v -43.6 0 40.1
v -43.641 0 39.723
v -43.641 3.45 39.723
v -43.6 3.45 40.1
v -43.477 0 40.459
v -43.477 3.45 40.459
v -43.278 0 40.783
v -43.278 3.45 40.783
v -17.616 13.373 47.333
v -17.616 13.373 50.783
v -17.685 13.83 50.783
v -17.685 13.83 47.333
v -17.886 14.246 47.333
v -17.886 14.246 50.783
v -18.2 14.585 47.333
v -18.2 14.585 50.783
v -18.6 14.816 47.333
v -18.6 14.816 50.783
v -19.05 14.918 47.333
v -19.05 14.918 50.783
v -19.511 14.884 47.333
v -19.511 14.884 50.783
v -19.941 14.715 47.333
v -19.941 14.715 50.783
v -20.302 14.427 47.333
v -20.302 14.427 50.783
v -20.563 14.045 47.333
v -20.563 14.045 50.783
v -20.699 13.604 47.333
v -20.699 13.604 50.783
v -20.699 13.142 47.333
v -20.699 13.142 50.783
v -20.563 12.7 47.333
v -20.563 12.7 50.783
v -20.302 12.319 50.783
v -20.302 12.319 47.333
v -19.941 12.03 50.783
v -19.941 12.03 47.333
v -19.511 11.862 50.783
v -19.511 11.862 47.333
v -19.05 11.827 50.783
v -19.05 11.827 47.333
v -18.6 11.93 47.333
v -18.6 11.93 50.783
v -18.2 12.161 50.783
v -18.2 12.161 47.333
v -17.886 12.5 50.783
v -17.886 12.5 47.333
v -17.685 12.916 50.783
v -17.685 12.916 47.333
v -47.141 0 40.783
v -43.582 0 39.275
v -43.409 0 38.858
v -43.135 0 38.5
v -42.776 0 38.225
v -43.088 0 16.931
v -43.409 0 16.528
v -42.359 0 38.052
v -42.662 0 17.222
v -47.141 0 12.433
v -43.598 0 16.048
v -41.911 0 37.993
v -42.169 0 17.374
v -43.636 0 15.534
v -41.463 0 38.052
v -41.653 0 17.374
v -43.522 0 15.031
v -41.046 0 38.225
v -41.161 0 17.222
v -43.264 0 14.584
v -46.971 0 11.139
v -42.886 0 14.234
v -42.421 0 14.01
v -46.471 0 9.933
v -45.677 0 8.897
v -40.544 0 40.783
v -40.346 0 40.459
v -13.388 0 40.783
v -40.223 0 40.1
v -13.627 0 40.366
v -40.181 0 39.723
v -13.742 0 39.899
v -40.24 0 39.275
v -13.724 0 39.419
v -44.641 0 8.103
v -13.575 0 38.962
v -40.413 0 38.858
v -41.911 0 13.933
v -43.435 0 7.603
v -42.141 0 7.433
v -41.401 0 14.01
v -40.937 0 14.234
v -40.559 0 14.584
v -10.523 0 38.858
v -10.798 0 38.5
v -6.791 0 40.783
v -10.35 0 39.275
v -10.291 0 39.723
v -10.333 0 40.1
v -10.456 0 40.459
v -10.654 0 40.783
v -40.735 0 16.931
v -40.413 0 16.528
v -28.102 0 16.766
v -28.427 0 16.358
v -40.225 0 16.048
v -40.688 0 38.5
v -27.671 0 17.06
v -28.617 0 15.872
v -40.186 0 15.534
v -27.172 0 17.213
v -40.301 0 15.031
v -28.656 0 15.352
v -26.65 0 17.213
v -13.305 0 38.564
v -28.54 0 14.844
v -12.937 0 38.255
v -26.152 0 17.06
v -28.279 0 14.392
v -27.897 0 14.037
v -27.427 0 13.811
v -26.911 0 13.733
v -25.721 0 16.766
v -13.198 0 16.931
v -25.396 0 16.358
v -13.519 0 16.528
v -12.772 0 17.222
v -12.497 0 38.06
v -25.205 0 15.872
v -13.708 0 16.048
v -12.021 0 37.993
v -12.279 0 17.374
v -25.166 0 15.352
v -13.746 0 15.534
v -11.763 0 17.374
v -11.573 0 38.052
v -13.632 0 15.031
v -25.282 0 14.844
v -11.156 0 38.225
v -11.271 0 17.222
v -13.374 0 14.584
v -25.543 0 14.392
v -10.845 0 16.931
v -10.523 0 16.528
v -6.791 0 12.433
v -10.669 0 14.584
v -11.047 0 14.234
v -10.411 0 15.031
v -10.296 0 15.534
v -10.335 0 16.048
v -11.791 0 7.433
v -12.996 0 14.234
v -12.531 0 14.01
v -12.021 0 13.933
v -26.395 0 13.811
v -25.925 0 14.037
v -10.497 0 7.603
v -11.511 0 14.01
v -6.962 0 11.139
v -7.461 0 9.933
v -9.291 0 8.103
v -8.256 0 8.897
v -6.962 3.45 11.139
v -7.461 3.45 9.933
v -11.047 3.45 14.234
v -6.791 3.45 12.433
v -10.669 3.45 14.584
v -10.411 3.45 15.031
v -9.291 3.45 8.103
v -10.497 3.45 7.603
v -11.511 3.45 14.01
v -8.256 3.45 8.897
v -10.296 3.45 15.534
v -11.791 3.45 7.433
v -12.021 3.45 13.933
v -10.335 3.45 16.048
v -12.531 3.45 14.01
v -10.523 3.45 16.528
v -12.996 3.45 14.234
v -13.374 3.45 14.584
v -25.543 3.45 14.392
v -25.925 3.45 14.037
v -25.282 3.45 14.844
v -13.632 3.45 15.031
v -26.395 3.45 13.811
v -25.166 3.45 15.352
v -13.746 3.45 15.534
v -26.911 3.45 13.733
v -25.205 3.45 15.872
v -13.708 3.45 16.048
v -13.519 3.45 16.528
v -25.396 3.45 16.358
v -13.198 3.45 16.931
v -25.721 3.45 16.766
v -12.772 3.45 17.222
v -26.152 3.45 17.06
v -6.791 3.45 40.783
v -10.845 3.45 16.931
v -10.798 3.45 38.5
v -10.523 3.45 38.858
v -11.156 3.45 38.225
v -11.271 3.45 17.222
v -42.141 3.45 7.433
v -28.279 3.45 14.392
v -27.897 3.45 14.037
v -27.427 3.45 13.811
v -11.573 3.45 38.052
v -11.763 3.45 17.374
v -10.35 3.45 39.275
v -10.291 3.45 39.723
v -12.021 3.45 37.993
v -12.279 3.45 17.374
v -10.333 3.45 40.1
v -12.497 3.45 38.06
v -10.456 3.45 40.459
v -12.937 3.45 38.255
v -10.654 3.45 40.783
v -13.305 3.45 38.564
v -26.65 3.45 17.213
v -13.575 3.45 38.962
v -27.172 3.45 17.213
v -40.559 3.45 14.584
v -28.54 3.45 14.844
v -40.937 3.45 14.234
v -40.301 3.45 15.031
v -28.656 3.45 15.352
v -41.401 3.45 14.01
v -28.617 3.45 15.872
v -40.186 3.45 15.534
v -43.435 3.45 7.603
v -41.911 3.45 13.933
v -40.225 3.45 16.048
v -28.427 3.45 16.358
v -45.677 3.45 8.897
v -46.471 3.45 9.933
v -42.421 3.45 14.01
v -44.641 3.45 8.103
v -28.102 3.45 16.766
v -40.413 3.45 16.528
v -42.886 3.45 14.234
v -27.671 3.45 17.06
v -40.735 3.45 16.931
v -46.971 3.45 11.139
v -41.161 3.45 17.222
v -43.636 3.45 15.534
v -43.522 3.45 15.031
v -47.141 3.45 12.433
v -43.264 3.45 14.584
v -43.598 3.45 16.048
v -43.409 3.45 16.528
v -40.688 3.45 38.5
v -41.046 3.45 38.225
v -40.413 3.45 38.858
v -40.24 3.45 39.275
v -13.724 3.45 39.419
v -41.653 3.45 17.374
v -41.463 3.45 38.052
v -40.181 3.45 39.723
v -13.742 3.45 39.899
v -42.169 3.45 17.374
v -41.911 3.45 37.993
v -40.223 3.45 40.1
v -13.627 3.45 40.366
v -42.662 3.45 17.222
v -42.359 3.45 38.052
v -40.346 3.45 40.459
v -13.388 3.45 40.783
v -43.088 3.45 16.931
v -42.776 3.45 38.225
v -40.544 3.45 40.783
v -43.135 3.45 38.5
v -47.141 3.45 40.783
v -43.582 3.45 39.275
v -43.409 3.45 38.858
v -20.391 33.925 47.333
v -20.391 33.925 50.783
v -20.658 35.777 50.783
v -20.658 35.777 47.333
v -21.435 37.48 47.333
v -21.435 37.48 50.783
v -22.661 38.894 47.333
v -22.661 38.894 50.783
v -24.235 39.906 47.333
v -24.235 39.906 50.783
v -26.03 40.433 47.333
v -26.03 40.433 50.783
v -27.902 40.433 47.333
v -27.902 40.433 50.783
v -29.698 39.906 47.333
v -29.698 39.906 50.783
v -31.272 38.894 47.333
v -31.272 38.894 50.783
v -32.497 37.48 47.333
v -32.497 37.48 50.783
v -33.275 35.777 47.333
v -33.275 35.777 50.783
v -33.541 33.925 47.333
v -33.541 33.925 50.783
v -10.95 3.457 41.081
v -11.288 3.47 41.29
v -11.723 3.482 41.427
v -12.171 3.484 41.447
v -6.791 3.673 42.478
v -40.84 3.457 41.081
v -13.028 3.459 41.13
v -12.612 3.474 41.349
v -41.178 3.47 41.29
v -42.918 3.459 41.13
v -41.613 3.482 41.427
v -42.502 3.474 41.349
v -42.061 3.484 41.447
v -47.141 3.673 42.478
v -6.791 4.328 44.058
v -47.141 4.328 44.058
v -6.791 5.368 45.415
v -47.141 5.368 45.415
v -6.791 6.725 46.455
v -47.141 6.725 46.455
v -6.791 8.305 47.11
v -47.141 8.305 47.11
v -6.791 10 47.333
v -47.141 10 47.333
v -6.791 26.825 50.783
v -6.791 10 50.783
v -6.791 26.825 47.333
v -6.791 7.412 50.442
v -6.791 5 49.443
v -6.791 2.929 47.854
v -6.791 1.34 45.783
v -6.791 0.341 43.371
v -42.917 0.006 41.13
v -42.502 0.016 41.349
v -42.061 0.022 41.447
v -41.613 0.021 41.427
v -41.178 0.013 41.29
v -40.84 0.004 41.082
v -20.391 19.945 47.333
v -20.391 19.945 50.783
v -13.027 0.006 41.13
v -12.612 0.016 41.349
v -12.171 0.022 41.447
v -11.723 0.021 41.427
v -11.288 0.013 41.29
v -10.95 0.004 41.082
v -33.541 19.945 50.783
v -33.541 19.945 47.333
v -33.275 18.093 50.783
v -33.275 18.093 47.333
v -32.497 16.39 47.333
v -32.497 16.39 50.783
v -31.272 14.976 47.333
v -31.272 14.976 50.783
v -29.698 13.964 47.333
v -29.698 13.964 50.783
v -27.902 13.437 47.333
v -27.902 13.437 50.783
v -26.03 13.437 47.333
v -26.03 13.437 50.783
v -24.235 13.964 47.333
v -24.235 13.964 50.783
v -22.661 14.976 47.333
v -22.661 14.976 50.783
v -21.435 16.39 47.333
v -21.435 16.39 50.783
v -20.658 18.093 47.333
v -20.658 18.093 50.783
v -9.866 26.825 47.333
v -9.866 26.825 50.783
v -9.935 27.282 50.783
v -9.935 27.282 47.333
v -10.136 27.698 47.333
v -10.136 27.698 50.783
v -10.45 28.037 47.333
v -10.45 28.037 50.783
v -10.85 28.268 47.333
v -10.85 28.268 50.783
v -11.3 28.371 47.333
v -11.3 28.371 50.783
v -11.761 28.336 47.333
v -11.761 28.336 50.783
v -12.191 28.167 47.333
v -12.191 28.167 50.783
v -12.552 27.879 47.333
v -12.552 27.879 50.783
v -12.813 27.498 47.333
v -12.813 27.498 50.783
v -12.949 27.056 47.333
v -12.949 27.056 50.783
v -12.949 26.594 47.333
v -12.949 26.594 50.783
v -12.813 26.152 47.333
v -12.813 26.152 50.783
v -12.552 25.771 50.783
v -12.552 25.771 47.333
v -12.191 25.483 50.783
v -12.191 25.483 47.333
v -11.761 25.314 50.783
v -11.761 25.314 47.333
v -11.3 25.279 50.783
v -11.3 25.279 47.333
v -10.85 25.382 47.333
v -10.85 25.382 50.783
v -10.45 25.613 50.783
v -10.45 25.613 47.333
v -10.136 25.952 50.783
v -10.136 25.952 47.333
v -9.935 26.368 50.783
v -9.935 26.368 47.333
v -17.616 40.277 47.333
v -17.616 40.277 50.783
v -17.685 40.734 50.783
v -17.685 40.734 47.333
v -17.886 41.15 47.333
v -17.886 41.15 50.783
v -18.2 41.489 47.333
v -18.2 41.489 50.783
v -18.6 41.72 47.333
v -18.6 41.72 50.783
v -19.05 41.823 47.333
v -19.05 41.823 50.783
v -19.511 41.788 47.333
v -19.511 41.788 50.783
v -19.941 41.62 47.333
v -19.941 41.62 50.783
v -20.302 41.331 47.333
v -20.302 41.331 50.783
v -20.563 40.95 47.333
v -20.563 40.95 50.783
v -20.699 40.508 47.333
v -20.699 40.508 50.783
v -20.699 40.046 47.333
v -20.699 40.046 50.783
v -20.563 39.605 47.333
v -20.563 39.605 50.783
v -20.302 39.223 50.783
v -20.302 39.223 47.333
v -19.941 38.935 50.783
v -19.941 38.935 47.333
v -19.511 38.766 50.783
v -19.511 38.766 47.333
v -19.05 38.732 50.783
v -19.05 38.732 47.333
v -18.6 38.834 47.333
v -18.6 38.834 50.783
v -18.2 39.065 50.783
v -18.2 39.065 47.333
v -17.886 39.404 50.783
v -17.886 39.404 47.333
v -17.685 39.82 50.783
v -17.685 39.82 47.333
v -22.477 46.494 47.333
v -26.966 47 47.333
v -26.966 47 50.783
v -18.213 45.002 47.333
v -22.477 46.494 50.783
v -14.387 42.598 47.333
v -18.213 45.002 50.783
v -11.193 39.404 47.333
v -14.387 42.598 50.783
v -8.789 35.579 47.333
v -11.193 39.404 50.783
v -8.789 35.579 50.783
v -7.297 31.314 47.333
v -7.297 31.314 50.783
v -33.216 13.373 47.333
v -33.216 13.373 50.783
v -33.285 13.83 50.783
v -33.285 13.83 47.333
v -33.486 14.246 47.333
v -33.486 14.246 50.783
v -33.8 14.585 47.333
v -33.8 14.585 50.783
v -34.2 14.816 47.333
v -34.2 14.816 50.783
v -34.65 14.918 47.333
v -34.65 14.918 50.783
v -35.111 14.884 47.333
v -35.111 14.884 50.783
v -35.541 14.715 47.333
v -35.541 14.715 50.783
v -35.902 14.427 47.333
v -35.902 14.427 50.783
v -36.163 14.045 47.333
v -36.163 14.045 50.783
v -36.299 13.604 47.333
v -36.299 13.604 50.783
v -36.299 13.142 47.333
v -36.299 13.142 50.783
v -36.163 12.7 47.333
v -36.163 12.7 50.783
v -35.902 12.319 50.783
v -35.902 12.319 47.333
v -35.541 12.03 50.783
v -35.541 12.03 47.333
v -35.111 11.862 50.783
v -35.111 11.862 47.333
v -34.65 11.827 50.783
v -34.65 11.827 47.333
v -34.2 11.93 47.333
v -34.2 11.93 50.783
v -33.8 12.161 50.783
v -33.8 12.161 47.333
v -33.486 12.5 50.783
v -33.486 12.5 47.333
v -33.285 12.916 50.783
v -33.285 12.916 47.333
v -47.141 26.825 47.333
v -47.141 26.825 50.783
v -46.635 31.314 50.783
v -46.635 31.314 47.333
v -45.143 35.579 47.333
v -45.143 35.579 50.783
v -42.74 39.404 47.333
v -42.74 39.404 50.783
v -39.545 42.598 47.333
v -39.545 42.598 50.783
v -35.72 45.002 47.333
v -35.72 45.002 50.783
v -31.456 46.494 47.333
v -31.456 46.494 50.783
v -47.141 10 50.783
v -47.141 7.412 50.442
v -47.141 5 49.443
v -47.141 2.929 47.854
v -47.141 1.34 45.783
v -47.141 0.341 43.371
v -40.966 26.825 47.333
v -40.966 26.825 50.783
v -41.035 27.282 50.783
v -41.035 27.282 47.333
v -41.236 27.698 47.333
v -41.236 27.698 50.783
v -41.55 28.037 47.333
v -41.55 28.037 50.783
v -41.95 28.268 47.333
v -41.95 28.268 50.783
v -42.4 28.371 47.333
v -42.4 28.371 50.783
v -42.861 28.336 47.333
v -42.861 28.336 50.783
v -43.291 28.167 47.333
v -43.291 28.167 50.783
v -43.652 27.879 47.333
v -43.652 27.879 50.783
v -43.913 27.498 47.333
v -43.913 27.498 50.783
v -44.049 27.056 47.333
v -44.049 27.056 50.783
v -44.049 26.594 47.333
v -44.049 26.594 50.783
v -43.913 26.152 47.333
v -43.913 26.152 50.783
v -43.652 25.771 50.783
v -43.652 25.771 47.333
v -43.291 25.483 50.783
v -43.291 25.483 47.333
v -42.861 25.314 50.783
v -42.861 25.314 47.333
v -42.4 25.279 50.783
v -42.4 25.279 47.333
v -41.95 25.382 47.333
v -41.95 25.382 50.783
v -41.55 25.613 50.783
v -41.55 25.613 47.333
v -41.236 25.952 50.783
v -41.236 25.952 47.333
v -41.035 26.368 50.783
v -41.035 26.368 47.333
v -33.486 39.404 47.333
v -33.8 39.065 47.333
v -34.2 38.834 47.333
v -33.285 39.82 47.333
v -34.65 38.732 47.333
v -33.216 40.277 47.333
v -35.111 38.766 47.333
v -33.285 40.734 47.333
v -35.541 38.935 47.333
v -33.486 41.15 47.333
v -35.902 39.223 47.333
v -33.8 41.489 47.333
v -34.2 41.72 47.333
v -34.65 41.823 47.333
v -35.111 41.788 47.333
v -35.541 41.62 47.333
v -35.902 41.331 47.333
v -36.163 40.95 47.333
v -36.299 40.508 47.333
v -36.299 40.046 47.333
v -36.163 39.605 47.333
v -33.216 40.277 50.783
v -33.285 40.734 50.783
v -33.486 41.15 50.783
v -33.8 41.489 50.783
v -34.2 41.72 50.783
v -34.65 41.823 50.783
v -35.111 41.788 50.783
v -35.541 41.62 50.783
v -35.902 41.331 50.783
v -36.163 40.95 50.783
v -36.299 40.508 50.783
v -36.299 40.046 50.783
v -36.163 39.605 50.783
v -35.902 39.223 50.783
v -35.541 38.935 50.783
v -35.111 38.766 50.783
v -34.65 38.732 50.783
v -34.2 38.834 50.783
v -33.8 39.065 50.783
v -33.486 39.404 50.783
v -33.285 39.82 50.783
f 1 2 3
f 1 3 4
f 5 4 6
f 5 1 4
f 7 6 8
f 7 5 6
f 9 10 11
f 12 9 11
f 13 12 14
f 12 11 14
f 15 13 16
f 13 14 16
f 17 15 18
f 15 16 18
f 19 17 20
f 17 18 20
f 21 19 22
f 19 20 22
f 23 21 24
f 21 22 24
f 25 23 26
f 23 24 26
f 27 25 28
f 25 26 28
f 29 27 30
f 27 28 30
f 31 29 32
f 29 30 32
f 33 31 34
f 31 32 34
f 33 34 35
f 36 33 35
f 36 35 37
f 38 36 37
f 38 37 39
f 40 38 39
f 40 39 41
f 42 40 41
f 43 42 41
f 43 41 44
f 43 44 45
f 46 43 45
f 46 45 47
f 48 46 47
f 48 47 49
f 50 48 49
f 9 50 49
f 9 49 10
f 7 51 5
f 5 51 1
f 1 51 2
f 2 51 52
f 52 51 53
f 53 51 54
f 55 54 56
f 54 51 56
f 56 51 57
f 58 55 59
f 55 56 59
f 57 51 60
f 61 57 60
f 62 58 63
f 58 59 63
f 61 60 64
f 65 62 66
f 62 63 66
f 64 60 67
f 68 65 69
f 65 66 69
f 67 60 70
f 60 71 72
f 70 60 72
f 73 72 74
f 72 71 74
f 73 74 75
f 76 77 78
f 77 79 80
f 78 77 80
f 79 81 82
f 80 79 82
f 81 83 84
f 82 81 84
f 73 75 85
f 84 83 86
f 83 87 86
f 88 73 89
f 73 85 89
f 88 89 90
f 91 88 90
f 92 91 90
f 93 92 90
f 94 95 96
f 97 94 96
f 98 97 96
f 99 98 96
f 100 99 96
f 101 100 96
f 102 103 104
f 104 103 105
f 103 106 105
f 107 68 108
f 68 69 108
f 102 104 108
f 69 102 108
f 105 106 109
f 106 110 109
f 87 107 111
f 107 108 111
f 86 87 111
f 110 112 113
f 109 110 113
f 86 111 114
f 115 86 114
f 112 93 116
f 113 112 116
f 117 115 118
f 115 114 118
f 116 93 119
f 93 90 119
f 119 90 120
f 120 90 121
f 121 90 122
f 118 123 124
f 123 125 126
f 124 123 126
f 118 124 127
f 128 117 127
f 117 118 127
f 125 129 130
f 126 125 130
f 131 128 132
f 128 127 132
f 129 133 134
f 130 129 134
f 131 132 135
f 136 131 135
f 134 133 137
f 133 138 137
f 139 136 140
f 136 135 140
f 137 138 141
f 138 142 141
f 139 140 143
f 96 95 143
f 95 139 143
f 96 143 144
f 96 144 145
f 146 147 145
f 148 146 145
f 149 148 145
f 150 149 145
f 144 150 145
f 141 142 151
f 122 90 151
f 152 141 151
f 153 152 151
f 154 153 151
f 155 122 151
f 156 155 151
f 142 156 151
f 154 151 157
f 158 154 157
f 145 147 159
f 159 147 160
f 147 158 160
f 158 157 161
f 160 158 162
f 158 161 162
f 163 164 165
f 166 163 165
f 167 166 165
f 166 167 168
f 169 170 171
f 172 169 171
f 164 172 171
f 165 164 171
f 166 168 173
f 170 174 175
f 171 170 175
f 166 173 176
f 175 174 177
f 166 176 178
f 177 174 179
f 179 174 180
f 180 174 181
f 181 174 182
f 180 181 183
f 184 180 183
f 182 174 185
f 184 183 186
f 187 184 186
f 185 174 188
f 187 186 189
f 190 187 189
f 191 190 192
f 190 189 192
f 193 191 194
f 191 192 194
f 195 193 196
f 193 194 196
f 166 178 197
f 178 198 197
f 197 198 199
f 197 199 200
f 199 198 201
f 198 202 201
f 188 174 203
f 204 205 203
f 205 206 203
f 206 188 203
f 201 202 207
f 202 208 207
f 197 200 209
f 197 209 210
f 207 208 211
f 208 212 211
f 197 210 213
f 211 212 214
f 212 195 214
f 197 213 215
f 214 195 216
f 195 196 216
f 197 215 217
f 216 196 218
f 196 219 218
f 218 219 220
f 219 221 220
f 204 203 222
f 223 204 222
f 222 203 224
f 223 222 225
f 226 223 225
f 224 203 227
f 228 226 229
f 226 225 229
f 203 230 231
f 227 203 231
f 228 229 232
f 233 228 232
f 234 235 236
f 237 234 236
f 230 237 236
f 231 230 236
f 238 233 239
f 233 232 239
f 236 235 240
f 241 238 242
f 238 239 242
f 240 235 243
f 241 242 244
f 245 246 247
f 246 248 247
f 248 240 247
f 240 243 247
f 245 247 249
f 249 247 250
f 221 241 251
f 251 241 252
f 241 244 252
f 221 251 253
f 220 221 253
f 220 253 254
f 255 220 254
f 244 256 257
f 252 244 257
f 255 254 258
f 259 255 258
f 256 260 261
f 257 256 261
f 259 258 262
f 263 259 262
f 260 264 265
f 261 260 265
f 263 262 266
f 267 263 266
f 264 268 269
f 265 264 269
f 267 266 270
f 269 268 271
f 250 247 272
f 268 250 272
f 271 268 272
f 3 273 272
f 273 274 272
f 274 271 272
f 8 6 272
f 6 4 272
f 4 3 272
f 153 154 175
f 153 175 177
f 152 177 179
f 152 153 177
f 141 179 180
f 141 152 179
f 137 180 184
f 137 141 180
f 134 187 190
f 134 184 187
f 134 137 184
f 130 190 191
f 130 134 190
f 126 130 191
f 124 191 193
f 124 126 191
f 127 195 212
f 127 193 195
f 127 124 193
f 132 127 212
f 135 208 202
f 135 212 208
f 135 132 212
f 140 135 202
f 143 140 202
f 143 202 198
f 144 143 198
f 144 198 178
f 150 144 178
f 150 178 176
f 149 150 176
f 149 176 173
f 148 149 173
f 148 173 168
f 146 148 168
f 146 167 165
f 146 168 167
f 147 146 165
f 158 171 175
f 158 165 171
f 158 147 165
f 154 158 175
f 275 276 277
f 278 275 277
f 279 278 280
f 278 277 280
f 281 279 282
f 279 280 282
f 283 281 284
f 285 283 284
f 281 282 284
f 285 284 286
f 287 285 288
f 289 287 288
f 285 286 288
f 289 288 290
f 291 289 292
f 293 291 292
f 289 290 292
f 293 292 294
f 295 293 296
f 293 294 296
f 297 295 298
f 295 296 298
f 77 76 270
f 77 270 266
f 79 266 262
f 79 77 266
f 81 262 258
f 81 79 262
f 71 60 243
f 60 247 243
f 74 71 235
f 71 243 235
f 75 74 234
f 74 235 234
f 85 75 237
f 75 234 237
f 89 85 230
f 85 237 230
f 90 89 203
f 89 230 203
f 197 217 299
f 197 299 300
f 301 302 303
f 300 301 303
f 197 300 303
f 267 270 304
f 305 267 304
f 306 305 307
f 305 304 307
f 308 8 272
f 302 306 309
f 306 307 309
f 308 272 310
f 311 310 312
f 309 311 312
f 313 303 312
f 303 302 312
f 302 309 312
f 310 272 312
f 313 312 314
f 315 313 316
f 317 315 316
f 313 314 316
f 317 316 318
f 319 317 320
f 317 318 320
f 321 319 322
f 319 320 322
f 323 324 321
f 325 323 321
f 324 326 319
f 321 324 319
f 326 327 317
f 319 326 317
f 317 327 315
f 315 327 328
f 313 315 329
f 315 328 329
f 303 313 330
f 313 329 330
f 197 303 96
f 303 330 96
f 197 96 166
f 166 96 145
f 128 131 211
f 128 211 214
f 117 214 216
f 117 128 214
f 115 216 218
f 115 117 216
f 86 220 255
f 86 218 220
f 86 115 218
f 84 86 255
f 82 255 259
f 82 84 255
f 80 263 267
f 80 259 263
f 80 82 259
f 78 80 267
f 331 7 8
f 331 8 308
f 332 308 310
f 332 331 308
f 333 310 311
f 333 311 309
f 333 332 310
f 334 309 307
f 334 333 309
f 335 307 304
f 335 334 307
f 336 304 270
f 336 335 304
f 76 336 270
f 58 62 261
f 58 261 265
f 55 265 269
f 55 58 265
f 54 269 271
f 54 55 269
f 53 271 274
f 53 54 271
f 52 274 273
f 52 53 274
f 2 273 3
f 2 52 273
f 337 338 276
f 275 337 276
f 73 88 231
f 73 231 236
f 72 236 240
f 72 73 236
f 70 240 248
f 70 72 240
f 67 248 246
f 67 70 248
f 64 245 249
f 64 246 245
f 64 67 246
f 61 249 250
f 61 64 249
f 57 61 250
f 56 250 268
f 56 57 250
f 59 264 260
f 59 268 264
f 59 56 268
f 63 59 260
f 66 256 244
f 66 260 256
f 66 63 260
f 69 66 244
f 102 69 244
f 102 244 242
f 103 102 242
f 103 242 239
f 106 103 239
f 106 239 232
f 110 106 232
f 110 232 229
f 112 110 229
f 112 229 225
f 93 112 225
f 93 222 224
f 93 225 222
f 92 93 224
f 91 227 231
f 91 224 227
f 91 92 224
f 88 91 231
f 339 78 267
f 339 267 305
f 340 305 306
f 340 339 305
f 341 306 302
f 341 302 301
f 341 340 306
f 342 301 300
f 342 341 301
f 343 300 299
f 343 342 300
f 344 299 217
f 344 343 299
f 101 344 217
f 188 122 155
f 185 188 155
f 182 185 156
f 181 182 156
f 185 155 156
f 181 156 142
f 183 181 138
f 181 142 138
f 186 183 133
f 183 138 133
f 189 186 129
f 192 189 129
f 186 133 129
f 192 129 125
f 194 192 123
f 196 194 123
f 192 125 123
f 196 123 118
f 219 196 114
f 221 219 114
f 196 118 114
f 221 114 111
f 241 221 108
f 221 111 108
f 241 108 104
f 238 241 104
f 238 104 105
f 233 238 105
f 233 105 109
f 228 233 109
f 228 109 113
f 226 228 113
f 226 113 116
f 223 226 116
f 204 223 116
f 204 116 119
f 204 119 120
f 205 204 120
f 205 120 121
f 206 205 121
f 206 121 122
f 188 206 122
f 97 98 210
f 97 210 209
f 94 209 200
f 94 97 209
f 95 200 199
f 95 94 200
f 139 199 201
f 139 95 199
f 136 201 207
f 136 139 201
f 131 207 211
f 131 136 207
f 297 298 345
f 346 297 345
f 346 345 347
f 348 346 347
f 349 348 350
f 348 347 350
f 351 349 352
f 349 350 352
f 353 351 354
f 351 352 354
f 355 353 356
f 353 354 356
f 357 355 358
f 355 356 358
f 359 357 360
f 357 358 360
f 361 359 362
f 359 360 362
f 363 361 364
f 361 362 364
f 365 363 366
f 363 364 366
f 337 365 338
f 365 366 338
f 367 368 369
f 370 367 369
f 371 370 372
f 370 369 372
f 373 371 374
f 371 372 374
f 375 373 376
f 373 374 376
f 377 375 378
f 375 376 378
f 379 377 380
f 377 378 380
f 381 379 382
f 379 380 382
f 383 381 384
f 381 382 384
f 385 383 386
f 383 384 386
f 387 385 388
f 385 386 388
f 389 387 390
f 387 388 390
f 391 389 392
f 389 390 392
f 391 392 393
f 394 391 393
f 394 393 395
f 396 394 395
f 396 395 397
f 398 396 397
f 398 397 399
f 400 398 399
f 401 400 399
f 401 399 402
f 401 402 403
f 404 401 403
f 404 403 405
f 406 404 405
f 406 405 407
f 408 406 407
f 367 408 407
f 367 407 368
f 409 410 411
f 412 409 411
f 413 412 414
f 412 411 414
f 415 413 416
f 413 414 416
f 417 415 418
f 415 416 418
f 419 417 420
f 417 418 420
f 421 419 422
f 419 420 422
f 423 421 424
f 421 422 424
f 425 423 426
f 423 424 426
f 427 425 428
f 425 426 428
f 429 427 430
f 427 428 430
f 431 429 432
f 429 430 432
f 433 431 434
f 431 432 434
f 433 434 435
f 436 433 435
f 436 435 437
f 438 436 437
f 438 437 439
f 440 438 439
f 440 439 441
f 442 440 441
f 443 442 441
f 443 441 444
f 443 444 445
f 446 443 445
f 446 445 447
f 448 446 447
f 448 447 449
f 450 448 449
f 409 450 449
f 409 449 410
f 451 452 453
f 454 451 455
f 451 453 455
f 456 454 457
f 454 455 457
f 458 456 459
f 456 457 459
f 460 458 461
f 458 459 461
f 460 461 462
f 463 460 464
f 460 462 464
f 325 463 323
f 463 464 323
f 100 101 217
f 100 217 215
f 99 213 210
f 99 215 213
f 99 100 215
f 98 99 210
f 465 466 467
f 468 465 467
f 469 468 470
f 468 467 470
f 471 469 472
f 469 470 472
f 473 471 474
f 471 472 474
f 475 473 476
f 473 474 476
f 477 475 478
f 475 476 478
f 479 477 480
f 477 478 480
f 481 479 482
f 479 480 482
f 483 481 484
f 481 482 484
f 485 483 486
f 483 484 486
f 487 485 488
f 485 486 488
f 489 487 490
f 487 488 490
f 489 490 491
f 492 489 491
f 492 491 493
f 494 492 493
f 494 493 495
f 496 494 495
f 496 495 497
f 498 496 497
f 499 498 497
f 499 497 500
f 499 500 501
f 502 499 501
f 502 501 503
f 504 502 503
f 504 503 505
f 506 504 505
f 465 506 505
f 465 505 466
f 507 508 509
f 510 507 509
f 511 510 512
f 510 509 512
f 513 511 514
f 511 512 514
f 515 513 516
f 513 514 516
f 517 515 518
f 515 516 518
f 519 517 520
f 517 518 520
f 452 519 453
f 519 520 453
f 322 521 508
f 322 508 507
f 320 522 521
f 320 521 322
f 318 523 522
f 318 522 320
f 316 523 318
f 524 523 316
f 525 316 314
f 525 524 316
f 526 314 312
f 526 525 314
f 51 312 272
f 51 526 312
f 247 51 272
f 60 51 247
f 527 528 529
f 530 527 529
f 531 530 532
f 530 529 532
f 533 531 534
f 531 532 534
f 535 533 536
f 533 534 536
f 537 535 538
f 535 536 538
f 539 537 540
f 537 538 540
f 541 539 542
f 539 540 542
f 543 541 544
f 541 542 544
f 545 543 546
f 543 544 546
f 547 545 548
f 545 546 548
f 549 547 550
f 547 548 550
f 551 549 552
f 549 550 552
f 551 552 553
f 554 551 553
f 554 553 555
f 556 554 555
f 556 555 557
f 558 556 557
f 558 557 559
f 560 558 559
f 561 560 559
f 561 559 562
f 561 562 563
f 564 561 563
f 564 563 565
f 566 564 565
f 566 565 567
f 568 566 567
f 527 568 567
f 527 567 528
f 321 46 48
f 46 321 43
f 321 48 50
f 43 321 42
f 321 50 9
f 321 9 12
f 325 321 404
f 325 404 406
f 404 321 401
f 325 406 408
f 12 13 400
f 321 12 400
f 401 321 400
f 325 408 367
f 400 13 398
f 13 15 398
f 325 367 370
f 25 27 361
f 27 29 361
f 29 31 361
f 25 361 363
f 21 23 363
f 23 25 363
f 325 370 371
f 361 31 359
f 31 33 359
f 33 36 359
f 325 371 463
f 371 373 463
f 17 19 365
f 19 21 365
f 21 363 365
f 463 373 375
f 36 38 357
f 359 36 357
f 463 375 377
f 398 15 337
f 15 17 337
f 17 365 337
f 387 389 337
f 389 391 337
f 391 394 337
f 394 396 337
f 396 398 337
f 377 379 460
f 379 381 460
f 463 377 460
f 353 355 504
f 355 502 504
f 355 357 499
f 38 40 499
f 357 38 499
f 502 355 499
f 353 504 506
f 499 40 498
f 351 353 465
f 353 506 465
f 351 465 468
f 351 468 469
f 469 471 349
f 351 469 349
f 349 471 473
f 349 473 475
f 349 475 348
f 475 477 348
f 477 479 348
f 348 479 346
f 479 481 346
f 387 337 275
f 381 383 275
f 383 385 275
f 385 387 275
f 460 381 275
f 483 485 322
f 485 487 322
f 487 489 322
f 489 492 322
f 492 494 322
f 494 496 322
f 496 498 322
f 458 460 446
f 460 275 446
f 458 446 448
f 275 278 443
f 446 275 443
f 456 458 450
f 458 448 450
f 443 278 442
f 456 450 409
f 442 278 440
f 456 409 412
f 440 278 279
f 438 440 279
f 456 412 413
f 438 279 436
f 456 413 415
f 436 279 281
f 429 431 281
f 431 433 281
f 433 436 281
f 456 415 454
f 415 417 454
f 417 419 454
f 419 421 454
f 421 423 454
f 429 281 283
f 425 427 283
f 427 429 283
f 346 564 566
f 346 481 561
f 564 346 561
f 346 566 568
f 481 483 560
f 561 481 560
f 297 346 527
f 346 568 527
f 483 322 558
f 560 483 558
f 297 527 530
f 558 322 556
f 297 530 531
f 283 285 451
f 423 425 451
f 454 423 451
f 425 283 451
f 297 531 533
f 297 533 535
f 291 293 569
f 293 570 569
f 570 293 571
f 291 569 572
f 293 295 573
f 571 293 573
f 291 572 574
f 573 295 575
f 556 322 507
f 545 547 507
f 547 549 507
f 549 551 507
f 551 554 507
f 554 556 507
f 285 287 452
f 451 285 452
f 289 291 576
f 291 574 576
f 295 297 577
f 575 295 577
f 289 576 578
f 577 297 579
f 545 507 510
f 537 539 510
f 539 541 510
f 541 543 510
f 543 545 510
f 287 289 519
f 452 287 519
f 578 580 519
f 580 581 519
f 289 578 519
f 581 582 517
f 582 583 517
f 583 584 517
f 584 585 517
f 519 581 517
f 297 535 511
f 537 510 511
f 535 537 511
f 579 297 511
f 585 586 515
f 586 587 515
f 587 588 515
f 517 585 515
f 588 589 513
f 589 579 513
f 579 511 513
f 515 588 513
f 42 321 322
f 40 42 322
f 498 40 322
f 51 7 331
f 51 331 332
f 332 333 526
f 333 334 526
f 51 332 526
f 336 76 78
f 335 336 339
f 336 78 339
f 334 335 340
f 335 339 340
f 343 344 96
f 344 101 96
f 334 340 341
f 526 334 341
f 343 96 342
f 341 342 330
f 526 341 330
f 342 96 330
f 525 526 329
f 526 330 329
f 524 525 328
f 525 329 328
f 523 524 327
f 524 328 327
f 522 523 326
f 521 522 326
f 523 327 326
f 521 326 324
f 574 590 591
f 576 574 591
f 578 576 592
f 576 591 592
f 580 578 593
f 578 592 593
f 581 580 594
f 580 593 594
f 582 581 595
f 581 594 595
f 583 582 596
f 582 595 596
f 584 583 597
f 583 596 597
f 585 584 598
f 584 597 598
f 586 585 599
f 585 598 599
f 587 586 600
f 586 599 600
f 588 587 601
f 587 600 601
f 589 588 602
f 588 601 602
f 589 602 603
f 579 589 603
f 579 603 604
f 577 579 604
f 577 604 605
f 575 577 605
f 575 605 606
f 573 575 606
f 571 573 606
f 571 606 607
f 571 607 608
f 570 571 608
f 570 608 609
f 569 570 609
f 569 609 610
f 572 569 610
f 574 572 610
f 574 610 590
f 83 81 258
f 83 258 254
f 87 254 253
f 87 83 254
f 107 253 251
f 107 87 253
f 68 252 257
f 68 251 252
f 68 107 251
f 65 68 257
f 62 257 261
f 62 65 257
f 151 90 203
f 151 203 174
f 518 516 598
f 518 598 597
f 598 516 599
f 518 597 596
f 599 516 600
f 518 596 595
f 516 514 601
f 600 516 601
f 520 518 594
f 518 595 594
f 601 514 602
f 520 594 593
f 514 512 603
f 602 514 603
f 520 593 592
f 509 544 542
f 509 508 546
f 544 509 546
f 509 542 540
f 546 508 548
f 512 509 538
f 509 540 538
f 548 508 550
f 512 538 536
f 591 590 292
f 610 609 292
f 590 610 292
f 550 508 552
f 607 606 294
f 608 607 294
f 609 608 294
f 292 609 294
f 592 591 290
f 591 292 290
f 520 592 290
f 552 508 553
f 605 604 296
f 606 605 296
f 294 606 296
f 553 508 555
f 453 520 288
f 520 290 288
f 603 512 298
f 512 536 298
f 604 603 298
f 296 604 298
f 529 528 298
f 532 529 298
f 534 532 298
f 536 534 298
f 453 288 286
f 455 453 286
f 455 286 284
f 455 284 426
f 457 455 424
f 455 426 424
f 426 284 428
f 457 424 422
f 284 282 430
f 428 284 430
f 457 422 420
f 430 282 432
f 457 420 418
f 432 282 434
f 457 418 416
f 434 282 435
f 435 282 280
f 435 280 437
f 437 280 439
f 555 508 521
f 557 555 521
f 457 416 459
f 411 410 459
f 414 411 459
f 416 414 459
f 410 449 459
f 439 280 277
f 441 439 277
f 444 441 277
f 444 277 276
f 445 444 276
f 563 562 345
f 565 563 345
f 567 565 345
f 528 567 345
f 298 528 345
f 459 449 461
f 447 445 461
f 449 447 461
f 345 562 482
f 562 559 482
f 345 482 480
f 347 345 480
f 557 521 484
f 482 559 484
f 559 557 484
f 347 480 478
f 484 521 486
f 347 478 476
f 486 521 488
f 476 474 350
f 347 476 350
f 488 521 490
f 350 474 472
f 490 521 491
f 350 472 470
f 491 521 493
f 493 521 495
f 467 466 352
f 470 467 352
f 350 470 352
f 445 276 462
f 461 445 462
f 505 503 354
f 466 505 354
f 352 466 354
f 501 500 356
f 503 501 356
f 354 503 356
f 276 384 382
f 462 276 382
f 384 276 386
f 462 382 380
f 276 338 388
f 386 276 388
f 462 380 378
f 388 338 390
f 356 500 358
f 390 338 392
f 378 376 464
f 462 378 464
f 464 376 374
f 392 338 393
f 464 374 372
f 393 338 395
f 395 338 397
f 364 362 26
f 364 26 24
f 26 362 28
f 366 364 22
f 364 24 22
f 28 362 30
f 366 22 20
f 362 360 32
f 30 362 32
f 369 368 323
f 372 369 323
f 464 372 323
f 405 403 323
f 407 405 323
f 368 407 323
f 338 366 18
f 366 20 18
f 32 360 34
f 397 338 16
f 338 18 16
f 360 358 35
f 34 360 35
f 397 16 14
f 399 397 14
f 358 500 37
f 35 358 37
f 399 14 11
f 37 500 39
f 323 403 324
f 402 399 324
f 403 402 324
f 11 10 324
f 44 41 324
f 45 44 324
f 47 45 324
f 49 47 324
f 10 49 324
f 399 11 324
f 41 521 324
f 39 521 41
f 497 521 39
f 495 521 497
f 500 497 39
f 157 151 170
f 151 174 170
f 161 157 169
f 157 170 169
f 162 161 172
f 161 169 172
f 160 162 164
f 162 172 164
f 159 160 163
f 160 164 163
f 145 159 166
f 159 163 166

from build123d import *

# Parameters (mm, degrees)
SKETCH1_W               = 40.35
SKETCH1_H               = 43.35
BOSS_EXTRUDE1_DEPTH     = 47
CUT_EXTRUDE2_DEPTH      = 102
FILLET1_R               = 10
CUT_EXTRUDE3_DEPTH      = 102
FILLET2_R               = 5
CUT_EXTRUDE4_DEPTH      = 102
CUT_EXTRUDE4_DEPTH_BACK = 102
SKETCH6_R               = 1.73
CUT_EXTRUDE5_DEPTH      = 102
SKETCH8_R               = 1.55
CUT_EXTRUDE6_DEPTH      = 102
SKETCH9_R               = 1.75
CUT_EXTRUDE7_DEPTH      = 10


with BuildPart() as part:
    # Sketch1 → Boss-Extrude1 (new body)
    with BuildSketch(Plane(origin=(0, 0, 0), x_dir=(1, 0, 0), z_dir=(0, 1, 0))):
        with Locations((-26.966212793, -29.108023223)):
            Rectangle(SKETCH1_W, SKETCH1_H)
    extrude(amount=BOSS_EXTRUDE1_DEPTH)

    # Sketch3 → Cut-Extrude2 (cut)
    with BuildSketch(Plane.XY.offset(50.783023223)):
        with BuildLine():
            Line((-6.791212793, 47), (-26.966212793, 47))
            ThreePointArc((-26.966212793, 47), (-12.700333482, 41.09087931), (-6.791212793, 26.825))
            Line((-6.791212793, 26.825), (-6.791212793, 47))
        make_face()
        with BuildLine():
            Line((-47.141212793, 47), (-47.141212793, 26.825))
            ThreePointArc((-47.141212793, 26.825), (-41.232092103, 41.09087931), (-26.966212793, 47))
            Line((-26.966212793, 47), (-47.141212793, 47))
        make_face()
    extrude(amount=-CUT_EXTRUDE2_DEPTH, mode=Mode.SUBTRACT)

    # Fillet1
    fillet1_edges = [part.edges().sort_by_distance(p)[0] for p in [
        (-26.966212793, 0, 50.783023223),
    ]]
    fillet(fillet1_edges, radius=FILLET1_R)

    # Sketch5 → Cut-Extrude3 (cut)
    with BuildSketch(Plane.ZY.offset(47.141212793)):
        with BuildLine():
            Line((47.333023223, 59.778436909), (-6.665763497, 59.778436909))
            Line((-6.665763497, 59.778436909), (-6.665763497, 3.45))
            Line((-6.665763497, 3.45), (40.783023223, 3.45))
            ThreePointArc((40.783023223, 3.45), (45.41457264, 5.368450583), (47.333023223, 10))
            Line((47.333023223, 10), (47.333023223, 59.778436909))
        make_face()
    extrude(amount=-CUT_EXTRUDE3_DEPTH, mode=Mode.SUBTRACT)

    # Fillet2
    fillet2_edges = [part.edges().sort_by_distance(p)[0] for p in [
        (-6.791212793, 1.725, 7.433023223),
        (-47.141212793, 1.725, 7.433023223),
    ]]
    fillet(fillet2_edges, radius=FILLET2_R)

    # Sketch6 → Cut-Extrude4 (cut, two sides: drawn at the far end of the back side and taken through both)
    with BuildSketch(Plane(origin=(0, 3.45, 0), x_dir=(1, 0, 0), z_dir=(0, 1, 0)).offset(-CUT_EXTRUDE4_DEPTH_BACK)):
        with Locations((-41.911212793, -15.663023223)):
            Circle(SKETCH6_R)
        with Locations((-41.911212793, -39.723023223)):
            Circle(SKETCH6_R)
        with Locations((-12.021212793, -15.663023223)):
            Circle(SKETCH6_R)
        with Locations((-12.021212793, -39.723023223)):
            Circle(SKETCH6_R)
    extrude(amount=CUT_EXTRUDE4_DEPTH + CUT_EXTRUDE4_DEPTH_BACK, mode=Mode.SUBTRACT)

    # Sketch7 → Cut-Extrude5 (cut)
    with BuildSketch(Plane.XY.offset(50.783023223)):
        with BuildLine():
            ThreePointArc((-26.966212793, 40.5), (-31.615439879, 38.574227086), (-33.541212793, 33.925))
            Line((-33.541212793, 33.925), (-33.541212793, 21.982917389))
            Line((-33.541212793, 21.982917389), (-33.541212793, 19.945))
            ThreePointArc((-33.541212793, 19.945), (-26.966212793, 13.37), (-20.391212793, 19.945))
            Line((-20.391212793, 19.945), (-20.391212793, 20.41689663))
            Line((-20.391212793, 20.41689663), (-20.391212793, 33.925))
            ThreePointArc((-20.391212793, 33.925), (-22.316985706, 38.574227086), (-26.966212793, 40.5))
        make_face()
    extrude(amount=-CUT_EXTRUDE5_DEPTH, mode=Mode.SUBTRACT)

    # Sketch8 → Cut-Extrude6 (cut)
    with BuildSketch(Plane.XY.offset(50.783023223)):
        with Locations((-42.516212793, 26.825)):
            Circle(SKETCH8_R)
        with Locations((-34.766212793, 40.277230298)):
            Circle(SKETCH8_R)
        with Locations((-34.766212793, 13.372769702)):
            Circle(SKETCH8_R)
        with Locations((-19.166212793, 13.372769702)):
            Circle(SKETCH8_R)
        with Locations((-11.416212793, 26.825)):
            Circle(SKETCH8_R)
        with Locations((-19.166212793, 40.277230298)):
            Circle(SKETCH8_R)
    extrude(amount=-CUT_EXTRUDE6_DEPTH, mode=Mode.SUBTRACT)

    # Sketch9 → Cut-Extrude7 (cut)
    with BuildSketch(Plane.XZ):
        with Locations((-26.911212793, 15.483023223)):
            Circle(SKETCH9_R)
    extrude(amount=-CUT_EXTRUDE7_DEPTH, mode=Mode.SUBTRACT)


solid = part.part
